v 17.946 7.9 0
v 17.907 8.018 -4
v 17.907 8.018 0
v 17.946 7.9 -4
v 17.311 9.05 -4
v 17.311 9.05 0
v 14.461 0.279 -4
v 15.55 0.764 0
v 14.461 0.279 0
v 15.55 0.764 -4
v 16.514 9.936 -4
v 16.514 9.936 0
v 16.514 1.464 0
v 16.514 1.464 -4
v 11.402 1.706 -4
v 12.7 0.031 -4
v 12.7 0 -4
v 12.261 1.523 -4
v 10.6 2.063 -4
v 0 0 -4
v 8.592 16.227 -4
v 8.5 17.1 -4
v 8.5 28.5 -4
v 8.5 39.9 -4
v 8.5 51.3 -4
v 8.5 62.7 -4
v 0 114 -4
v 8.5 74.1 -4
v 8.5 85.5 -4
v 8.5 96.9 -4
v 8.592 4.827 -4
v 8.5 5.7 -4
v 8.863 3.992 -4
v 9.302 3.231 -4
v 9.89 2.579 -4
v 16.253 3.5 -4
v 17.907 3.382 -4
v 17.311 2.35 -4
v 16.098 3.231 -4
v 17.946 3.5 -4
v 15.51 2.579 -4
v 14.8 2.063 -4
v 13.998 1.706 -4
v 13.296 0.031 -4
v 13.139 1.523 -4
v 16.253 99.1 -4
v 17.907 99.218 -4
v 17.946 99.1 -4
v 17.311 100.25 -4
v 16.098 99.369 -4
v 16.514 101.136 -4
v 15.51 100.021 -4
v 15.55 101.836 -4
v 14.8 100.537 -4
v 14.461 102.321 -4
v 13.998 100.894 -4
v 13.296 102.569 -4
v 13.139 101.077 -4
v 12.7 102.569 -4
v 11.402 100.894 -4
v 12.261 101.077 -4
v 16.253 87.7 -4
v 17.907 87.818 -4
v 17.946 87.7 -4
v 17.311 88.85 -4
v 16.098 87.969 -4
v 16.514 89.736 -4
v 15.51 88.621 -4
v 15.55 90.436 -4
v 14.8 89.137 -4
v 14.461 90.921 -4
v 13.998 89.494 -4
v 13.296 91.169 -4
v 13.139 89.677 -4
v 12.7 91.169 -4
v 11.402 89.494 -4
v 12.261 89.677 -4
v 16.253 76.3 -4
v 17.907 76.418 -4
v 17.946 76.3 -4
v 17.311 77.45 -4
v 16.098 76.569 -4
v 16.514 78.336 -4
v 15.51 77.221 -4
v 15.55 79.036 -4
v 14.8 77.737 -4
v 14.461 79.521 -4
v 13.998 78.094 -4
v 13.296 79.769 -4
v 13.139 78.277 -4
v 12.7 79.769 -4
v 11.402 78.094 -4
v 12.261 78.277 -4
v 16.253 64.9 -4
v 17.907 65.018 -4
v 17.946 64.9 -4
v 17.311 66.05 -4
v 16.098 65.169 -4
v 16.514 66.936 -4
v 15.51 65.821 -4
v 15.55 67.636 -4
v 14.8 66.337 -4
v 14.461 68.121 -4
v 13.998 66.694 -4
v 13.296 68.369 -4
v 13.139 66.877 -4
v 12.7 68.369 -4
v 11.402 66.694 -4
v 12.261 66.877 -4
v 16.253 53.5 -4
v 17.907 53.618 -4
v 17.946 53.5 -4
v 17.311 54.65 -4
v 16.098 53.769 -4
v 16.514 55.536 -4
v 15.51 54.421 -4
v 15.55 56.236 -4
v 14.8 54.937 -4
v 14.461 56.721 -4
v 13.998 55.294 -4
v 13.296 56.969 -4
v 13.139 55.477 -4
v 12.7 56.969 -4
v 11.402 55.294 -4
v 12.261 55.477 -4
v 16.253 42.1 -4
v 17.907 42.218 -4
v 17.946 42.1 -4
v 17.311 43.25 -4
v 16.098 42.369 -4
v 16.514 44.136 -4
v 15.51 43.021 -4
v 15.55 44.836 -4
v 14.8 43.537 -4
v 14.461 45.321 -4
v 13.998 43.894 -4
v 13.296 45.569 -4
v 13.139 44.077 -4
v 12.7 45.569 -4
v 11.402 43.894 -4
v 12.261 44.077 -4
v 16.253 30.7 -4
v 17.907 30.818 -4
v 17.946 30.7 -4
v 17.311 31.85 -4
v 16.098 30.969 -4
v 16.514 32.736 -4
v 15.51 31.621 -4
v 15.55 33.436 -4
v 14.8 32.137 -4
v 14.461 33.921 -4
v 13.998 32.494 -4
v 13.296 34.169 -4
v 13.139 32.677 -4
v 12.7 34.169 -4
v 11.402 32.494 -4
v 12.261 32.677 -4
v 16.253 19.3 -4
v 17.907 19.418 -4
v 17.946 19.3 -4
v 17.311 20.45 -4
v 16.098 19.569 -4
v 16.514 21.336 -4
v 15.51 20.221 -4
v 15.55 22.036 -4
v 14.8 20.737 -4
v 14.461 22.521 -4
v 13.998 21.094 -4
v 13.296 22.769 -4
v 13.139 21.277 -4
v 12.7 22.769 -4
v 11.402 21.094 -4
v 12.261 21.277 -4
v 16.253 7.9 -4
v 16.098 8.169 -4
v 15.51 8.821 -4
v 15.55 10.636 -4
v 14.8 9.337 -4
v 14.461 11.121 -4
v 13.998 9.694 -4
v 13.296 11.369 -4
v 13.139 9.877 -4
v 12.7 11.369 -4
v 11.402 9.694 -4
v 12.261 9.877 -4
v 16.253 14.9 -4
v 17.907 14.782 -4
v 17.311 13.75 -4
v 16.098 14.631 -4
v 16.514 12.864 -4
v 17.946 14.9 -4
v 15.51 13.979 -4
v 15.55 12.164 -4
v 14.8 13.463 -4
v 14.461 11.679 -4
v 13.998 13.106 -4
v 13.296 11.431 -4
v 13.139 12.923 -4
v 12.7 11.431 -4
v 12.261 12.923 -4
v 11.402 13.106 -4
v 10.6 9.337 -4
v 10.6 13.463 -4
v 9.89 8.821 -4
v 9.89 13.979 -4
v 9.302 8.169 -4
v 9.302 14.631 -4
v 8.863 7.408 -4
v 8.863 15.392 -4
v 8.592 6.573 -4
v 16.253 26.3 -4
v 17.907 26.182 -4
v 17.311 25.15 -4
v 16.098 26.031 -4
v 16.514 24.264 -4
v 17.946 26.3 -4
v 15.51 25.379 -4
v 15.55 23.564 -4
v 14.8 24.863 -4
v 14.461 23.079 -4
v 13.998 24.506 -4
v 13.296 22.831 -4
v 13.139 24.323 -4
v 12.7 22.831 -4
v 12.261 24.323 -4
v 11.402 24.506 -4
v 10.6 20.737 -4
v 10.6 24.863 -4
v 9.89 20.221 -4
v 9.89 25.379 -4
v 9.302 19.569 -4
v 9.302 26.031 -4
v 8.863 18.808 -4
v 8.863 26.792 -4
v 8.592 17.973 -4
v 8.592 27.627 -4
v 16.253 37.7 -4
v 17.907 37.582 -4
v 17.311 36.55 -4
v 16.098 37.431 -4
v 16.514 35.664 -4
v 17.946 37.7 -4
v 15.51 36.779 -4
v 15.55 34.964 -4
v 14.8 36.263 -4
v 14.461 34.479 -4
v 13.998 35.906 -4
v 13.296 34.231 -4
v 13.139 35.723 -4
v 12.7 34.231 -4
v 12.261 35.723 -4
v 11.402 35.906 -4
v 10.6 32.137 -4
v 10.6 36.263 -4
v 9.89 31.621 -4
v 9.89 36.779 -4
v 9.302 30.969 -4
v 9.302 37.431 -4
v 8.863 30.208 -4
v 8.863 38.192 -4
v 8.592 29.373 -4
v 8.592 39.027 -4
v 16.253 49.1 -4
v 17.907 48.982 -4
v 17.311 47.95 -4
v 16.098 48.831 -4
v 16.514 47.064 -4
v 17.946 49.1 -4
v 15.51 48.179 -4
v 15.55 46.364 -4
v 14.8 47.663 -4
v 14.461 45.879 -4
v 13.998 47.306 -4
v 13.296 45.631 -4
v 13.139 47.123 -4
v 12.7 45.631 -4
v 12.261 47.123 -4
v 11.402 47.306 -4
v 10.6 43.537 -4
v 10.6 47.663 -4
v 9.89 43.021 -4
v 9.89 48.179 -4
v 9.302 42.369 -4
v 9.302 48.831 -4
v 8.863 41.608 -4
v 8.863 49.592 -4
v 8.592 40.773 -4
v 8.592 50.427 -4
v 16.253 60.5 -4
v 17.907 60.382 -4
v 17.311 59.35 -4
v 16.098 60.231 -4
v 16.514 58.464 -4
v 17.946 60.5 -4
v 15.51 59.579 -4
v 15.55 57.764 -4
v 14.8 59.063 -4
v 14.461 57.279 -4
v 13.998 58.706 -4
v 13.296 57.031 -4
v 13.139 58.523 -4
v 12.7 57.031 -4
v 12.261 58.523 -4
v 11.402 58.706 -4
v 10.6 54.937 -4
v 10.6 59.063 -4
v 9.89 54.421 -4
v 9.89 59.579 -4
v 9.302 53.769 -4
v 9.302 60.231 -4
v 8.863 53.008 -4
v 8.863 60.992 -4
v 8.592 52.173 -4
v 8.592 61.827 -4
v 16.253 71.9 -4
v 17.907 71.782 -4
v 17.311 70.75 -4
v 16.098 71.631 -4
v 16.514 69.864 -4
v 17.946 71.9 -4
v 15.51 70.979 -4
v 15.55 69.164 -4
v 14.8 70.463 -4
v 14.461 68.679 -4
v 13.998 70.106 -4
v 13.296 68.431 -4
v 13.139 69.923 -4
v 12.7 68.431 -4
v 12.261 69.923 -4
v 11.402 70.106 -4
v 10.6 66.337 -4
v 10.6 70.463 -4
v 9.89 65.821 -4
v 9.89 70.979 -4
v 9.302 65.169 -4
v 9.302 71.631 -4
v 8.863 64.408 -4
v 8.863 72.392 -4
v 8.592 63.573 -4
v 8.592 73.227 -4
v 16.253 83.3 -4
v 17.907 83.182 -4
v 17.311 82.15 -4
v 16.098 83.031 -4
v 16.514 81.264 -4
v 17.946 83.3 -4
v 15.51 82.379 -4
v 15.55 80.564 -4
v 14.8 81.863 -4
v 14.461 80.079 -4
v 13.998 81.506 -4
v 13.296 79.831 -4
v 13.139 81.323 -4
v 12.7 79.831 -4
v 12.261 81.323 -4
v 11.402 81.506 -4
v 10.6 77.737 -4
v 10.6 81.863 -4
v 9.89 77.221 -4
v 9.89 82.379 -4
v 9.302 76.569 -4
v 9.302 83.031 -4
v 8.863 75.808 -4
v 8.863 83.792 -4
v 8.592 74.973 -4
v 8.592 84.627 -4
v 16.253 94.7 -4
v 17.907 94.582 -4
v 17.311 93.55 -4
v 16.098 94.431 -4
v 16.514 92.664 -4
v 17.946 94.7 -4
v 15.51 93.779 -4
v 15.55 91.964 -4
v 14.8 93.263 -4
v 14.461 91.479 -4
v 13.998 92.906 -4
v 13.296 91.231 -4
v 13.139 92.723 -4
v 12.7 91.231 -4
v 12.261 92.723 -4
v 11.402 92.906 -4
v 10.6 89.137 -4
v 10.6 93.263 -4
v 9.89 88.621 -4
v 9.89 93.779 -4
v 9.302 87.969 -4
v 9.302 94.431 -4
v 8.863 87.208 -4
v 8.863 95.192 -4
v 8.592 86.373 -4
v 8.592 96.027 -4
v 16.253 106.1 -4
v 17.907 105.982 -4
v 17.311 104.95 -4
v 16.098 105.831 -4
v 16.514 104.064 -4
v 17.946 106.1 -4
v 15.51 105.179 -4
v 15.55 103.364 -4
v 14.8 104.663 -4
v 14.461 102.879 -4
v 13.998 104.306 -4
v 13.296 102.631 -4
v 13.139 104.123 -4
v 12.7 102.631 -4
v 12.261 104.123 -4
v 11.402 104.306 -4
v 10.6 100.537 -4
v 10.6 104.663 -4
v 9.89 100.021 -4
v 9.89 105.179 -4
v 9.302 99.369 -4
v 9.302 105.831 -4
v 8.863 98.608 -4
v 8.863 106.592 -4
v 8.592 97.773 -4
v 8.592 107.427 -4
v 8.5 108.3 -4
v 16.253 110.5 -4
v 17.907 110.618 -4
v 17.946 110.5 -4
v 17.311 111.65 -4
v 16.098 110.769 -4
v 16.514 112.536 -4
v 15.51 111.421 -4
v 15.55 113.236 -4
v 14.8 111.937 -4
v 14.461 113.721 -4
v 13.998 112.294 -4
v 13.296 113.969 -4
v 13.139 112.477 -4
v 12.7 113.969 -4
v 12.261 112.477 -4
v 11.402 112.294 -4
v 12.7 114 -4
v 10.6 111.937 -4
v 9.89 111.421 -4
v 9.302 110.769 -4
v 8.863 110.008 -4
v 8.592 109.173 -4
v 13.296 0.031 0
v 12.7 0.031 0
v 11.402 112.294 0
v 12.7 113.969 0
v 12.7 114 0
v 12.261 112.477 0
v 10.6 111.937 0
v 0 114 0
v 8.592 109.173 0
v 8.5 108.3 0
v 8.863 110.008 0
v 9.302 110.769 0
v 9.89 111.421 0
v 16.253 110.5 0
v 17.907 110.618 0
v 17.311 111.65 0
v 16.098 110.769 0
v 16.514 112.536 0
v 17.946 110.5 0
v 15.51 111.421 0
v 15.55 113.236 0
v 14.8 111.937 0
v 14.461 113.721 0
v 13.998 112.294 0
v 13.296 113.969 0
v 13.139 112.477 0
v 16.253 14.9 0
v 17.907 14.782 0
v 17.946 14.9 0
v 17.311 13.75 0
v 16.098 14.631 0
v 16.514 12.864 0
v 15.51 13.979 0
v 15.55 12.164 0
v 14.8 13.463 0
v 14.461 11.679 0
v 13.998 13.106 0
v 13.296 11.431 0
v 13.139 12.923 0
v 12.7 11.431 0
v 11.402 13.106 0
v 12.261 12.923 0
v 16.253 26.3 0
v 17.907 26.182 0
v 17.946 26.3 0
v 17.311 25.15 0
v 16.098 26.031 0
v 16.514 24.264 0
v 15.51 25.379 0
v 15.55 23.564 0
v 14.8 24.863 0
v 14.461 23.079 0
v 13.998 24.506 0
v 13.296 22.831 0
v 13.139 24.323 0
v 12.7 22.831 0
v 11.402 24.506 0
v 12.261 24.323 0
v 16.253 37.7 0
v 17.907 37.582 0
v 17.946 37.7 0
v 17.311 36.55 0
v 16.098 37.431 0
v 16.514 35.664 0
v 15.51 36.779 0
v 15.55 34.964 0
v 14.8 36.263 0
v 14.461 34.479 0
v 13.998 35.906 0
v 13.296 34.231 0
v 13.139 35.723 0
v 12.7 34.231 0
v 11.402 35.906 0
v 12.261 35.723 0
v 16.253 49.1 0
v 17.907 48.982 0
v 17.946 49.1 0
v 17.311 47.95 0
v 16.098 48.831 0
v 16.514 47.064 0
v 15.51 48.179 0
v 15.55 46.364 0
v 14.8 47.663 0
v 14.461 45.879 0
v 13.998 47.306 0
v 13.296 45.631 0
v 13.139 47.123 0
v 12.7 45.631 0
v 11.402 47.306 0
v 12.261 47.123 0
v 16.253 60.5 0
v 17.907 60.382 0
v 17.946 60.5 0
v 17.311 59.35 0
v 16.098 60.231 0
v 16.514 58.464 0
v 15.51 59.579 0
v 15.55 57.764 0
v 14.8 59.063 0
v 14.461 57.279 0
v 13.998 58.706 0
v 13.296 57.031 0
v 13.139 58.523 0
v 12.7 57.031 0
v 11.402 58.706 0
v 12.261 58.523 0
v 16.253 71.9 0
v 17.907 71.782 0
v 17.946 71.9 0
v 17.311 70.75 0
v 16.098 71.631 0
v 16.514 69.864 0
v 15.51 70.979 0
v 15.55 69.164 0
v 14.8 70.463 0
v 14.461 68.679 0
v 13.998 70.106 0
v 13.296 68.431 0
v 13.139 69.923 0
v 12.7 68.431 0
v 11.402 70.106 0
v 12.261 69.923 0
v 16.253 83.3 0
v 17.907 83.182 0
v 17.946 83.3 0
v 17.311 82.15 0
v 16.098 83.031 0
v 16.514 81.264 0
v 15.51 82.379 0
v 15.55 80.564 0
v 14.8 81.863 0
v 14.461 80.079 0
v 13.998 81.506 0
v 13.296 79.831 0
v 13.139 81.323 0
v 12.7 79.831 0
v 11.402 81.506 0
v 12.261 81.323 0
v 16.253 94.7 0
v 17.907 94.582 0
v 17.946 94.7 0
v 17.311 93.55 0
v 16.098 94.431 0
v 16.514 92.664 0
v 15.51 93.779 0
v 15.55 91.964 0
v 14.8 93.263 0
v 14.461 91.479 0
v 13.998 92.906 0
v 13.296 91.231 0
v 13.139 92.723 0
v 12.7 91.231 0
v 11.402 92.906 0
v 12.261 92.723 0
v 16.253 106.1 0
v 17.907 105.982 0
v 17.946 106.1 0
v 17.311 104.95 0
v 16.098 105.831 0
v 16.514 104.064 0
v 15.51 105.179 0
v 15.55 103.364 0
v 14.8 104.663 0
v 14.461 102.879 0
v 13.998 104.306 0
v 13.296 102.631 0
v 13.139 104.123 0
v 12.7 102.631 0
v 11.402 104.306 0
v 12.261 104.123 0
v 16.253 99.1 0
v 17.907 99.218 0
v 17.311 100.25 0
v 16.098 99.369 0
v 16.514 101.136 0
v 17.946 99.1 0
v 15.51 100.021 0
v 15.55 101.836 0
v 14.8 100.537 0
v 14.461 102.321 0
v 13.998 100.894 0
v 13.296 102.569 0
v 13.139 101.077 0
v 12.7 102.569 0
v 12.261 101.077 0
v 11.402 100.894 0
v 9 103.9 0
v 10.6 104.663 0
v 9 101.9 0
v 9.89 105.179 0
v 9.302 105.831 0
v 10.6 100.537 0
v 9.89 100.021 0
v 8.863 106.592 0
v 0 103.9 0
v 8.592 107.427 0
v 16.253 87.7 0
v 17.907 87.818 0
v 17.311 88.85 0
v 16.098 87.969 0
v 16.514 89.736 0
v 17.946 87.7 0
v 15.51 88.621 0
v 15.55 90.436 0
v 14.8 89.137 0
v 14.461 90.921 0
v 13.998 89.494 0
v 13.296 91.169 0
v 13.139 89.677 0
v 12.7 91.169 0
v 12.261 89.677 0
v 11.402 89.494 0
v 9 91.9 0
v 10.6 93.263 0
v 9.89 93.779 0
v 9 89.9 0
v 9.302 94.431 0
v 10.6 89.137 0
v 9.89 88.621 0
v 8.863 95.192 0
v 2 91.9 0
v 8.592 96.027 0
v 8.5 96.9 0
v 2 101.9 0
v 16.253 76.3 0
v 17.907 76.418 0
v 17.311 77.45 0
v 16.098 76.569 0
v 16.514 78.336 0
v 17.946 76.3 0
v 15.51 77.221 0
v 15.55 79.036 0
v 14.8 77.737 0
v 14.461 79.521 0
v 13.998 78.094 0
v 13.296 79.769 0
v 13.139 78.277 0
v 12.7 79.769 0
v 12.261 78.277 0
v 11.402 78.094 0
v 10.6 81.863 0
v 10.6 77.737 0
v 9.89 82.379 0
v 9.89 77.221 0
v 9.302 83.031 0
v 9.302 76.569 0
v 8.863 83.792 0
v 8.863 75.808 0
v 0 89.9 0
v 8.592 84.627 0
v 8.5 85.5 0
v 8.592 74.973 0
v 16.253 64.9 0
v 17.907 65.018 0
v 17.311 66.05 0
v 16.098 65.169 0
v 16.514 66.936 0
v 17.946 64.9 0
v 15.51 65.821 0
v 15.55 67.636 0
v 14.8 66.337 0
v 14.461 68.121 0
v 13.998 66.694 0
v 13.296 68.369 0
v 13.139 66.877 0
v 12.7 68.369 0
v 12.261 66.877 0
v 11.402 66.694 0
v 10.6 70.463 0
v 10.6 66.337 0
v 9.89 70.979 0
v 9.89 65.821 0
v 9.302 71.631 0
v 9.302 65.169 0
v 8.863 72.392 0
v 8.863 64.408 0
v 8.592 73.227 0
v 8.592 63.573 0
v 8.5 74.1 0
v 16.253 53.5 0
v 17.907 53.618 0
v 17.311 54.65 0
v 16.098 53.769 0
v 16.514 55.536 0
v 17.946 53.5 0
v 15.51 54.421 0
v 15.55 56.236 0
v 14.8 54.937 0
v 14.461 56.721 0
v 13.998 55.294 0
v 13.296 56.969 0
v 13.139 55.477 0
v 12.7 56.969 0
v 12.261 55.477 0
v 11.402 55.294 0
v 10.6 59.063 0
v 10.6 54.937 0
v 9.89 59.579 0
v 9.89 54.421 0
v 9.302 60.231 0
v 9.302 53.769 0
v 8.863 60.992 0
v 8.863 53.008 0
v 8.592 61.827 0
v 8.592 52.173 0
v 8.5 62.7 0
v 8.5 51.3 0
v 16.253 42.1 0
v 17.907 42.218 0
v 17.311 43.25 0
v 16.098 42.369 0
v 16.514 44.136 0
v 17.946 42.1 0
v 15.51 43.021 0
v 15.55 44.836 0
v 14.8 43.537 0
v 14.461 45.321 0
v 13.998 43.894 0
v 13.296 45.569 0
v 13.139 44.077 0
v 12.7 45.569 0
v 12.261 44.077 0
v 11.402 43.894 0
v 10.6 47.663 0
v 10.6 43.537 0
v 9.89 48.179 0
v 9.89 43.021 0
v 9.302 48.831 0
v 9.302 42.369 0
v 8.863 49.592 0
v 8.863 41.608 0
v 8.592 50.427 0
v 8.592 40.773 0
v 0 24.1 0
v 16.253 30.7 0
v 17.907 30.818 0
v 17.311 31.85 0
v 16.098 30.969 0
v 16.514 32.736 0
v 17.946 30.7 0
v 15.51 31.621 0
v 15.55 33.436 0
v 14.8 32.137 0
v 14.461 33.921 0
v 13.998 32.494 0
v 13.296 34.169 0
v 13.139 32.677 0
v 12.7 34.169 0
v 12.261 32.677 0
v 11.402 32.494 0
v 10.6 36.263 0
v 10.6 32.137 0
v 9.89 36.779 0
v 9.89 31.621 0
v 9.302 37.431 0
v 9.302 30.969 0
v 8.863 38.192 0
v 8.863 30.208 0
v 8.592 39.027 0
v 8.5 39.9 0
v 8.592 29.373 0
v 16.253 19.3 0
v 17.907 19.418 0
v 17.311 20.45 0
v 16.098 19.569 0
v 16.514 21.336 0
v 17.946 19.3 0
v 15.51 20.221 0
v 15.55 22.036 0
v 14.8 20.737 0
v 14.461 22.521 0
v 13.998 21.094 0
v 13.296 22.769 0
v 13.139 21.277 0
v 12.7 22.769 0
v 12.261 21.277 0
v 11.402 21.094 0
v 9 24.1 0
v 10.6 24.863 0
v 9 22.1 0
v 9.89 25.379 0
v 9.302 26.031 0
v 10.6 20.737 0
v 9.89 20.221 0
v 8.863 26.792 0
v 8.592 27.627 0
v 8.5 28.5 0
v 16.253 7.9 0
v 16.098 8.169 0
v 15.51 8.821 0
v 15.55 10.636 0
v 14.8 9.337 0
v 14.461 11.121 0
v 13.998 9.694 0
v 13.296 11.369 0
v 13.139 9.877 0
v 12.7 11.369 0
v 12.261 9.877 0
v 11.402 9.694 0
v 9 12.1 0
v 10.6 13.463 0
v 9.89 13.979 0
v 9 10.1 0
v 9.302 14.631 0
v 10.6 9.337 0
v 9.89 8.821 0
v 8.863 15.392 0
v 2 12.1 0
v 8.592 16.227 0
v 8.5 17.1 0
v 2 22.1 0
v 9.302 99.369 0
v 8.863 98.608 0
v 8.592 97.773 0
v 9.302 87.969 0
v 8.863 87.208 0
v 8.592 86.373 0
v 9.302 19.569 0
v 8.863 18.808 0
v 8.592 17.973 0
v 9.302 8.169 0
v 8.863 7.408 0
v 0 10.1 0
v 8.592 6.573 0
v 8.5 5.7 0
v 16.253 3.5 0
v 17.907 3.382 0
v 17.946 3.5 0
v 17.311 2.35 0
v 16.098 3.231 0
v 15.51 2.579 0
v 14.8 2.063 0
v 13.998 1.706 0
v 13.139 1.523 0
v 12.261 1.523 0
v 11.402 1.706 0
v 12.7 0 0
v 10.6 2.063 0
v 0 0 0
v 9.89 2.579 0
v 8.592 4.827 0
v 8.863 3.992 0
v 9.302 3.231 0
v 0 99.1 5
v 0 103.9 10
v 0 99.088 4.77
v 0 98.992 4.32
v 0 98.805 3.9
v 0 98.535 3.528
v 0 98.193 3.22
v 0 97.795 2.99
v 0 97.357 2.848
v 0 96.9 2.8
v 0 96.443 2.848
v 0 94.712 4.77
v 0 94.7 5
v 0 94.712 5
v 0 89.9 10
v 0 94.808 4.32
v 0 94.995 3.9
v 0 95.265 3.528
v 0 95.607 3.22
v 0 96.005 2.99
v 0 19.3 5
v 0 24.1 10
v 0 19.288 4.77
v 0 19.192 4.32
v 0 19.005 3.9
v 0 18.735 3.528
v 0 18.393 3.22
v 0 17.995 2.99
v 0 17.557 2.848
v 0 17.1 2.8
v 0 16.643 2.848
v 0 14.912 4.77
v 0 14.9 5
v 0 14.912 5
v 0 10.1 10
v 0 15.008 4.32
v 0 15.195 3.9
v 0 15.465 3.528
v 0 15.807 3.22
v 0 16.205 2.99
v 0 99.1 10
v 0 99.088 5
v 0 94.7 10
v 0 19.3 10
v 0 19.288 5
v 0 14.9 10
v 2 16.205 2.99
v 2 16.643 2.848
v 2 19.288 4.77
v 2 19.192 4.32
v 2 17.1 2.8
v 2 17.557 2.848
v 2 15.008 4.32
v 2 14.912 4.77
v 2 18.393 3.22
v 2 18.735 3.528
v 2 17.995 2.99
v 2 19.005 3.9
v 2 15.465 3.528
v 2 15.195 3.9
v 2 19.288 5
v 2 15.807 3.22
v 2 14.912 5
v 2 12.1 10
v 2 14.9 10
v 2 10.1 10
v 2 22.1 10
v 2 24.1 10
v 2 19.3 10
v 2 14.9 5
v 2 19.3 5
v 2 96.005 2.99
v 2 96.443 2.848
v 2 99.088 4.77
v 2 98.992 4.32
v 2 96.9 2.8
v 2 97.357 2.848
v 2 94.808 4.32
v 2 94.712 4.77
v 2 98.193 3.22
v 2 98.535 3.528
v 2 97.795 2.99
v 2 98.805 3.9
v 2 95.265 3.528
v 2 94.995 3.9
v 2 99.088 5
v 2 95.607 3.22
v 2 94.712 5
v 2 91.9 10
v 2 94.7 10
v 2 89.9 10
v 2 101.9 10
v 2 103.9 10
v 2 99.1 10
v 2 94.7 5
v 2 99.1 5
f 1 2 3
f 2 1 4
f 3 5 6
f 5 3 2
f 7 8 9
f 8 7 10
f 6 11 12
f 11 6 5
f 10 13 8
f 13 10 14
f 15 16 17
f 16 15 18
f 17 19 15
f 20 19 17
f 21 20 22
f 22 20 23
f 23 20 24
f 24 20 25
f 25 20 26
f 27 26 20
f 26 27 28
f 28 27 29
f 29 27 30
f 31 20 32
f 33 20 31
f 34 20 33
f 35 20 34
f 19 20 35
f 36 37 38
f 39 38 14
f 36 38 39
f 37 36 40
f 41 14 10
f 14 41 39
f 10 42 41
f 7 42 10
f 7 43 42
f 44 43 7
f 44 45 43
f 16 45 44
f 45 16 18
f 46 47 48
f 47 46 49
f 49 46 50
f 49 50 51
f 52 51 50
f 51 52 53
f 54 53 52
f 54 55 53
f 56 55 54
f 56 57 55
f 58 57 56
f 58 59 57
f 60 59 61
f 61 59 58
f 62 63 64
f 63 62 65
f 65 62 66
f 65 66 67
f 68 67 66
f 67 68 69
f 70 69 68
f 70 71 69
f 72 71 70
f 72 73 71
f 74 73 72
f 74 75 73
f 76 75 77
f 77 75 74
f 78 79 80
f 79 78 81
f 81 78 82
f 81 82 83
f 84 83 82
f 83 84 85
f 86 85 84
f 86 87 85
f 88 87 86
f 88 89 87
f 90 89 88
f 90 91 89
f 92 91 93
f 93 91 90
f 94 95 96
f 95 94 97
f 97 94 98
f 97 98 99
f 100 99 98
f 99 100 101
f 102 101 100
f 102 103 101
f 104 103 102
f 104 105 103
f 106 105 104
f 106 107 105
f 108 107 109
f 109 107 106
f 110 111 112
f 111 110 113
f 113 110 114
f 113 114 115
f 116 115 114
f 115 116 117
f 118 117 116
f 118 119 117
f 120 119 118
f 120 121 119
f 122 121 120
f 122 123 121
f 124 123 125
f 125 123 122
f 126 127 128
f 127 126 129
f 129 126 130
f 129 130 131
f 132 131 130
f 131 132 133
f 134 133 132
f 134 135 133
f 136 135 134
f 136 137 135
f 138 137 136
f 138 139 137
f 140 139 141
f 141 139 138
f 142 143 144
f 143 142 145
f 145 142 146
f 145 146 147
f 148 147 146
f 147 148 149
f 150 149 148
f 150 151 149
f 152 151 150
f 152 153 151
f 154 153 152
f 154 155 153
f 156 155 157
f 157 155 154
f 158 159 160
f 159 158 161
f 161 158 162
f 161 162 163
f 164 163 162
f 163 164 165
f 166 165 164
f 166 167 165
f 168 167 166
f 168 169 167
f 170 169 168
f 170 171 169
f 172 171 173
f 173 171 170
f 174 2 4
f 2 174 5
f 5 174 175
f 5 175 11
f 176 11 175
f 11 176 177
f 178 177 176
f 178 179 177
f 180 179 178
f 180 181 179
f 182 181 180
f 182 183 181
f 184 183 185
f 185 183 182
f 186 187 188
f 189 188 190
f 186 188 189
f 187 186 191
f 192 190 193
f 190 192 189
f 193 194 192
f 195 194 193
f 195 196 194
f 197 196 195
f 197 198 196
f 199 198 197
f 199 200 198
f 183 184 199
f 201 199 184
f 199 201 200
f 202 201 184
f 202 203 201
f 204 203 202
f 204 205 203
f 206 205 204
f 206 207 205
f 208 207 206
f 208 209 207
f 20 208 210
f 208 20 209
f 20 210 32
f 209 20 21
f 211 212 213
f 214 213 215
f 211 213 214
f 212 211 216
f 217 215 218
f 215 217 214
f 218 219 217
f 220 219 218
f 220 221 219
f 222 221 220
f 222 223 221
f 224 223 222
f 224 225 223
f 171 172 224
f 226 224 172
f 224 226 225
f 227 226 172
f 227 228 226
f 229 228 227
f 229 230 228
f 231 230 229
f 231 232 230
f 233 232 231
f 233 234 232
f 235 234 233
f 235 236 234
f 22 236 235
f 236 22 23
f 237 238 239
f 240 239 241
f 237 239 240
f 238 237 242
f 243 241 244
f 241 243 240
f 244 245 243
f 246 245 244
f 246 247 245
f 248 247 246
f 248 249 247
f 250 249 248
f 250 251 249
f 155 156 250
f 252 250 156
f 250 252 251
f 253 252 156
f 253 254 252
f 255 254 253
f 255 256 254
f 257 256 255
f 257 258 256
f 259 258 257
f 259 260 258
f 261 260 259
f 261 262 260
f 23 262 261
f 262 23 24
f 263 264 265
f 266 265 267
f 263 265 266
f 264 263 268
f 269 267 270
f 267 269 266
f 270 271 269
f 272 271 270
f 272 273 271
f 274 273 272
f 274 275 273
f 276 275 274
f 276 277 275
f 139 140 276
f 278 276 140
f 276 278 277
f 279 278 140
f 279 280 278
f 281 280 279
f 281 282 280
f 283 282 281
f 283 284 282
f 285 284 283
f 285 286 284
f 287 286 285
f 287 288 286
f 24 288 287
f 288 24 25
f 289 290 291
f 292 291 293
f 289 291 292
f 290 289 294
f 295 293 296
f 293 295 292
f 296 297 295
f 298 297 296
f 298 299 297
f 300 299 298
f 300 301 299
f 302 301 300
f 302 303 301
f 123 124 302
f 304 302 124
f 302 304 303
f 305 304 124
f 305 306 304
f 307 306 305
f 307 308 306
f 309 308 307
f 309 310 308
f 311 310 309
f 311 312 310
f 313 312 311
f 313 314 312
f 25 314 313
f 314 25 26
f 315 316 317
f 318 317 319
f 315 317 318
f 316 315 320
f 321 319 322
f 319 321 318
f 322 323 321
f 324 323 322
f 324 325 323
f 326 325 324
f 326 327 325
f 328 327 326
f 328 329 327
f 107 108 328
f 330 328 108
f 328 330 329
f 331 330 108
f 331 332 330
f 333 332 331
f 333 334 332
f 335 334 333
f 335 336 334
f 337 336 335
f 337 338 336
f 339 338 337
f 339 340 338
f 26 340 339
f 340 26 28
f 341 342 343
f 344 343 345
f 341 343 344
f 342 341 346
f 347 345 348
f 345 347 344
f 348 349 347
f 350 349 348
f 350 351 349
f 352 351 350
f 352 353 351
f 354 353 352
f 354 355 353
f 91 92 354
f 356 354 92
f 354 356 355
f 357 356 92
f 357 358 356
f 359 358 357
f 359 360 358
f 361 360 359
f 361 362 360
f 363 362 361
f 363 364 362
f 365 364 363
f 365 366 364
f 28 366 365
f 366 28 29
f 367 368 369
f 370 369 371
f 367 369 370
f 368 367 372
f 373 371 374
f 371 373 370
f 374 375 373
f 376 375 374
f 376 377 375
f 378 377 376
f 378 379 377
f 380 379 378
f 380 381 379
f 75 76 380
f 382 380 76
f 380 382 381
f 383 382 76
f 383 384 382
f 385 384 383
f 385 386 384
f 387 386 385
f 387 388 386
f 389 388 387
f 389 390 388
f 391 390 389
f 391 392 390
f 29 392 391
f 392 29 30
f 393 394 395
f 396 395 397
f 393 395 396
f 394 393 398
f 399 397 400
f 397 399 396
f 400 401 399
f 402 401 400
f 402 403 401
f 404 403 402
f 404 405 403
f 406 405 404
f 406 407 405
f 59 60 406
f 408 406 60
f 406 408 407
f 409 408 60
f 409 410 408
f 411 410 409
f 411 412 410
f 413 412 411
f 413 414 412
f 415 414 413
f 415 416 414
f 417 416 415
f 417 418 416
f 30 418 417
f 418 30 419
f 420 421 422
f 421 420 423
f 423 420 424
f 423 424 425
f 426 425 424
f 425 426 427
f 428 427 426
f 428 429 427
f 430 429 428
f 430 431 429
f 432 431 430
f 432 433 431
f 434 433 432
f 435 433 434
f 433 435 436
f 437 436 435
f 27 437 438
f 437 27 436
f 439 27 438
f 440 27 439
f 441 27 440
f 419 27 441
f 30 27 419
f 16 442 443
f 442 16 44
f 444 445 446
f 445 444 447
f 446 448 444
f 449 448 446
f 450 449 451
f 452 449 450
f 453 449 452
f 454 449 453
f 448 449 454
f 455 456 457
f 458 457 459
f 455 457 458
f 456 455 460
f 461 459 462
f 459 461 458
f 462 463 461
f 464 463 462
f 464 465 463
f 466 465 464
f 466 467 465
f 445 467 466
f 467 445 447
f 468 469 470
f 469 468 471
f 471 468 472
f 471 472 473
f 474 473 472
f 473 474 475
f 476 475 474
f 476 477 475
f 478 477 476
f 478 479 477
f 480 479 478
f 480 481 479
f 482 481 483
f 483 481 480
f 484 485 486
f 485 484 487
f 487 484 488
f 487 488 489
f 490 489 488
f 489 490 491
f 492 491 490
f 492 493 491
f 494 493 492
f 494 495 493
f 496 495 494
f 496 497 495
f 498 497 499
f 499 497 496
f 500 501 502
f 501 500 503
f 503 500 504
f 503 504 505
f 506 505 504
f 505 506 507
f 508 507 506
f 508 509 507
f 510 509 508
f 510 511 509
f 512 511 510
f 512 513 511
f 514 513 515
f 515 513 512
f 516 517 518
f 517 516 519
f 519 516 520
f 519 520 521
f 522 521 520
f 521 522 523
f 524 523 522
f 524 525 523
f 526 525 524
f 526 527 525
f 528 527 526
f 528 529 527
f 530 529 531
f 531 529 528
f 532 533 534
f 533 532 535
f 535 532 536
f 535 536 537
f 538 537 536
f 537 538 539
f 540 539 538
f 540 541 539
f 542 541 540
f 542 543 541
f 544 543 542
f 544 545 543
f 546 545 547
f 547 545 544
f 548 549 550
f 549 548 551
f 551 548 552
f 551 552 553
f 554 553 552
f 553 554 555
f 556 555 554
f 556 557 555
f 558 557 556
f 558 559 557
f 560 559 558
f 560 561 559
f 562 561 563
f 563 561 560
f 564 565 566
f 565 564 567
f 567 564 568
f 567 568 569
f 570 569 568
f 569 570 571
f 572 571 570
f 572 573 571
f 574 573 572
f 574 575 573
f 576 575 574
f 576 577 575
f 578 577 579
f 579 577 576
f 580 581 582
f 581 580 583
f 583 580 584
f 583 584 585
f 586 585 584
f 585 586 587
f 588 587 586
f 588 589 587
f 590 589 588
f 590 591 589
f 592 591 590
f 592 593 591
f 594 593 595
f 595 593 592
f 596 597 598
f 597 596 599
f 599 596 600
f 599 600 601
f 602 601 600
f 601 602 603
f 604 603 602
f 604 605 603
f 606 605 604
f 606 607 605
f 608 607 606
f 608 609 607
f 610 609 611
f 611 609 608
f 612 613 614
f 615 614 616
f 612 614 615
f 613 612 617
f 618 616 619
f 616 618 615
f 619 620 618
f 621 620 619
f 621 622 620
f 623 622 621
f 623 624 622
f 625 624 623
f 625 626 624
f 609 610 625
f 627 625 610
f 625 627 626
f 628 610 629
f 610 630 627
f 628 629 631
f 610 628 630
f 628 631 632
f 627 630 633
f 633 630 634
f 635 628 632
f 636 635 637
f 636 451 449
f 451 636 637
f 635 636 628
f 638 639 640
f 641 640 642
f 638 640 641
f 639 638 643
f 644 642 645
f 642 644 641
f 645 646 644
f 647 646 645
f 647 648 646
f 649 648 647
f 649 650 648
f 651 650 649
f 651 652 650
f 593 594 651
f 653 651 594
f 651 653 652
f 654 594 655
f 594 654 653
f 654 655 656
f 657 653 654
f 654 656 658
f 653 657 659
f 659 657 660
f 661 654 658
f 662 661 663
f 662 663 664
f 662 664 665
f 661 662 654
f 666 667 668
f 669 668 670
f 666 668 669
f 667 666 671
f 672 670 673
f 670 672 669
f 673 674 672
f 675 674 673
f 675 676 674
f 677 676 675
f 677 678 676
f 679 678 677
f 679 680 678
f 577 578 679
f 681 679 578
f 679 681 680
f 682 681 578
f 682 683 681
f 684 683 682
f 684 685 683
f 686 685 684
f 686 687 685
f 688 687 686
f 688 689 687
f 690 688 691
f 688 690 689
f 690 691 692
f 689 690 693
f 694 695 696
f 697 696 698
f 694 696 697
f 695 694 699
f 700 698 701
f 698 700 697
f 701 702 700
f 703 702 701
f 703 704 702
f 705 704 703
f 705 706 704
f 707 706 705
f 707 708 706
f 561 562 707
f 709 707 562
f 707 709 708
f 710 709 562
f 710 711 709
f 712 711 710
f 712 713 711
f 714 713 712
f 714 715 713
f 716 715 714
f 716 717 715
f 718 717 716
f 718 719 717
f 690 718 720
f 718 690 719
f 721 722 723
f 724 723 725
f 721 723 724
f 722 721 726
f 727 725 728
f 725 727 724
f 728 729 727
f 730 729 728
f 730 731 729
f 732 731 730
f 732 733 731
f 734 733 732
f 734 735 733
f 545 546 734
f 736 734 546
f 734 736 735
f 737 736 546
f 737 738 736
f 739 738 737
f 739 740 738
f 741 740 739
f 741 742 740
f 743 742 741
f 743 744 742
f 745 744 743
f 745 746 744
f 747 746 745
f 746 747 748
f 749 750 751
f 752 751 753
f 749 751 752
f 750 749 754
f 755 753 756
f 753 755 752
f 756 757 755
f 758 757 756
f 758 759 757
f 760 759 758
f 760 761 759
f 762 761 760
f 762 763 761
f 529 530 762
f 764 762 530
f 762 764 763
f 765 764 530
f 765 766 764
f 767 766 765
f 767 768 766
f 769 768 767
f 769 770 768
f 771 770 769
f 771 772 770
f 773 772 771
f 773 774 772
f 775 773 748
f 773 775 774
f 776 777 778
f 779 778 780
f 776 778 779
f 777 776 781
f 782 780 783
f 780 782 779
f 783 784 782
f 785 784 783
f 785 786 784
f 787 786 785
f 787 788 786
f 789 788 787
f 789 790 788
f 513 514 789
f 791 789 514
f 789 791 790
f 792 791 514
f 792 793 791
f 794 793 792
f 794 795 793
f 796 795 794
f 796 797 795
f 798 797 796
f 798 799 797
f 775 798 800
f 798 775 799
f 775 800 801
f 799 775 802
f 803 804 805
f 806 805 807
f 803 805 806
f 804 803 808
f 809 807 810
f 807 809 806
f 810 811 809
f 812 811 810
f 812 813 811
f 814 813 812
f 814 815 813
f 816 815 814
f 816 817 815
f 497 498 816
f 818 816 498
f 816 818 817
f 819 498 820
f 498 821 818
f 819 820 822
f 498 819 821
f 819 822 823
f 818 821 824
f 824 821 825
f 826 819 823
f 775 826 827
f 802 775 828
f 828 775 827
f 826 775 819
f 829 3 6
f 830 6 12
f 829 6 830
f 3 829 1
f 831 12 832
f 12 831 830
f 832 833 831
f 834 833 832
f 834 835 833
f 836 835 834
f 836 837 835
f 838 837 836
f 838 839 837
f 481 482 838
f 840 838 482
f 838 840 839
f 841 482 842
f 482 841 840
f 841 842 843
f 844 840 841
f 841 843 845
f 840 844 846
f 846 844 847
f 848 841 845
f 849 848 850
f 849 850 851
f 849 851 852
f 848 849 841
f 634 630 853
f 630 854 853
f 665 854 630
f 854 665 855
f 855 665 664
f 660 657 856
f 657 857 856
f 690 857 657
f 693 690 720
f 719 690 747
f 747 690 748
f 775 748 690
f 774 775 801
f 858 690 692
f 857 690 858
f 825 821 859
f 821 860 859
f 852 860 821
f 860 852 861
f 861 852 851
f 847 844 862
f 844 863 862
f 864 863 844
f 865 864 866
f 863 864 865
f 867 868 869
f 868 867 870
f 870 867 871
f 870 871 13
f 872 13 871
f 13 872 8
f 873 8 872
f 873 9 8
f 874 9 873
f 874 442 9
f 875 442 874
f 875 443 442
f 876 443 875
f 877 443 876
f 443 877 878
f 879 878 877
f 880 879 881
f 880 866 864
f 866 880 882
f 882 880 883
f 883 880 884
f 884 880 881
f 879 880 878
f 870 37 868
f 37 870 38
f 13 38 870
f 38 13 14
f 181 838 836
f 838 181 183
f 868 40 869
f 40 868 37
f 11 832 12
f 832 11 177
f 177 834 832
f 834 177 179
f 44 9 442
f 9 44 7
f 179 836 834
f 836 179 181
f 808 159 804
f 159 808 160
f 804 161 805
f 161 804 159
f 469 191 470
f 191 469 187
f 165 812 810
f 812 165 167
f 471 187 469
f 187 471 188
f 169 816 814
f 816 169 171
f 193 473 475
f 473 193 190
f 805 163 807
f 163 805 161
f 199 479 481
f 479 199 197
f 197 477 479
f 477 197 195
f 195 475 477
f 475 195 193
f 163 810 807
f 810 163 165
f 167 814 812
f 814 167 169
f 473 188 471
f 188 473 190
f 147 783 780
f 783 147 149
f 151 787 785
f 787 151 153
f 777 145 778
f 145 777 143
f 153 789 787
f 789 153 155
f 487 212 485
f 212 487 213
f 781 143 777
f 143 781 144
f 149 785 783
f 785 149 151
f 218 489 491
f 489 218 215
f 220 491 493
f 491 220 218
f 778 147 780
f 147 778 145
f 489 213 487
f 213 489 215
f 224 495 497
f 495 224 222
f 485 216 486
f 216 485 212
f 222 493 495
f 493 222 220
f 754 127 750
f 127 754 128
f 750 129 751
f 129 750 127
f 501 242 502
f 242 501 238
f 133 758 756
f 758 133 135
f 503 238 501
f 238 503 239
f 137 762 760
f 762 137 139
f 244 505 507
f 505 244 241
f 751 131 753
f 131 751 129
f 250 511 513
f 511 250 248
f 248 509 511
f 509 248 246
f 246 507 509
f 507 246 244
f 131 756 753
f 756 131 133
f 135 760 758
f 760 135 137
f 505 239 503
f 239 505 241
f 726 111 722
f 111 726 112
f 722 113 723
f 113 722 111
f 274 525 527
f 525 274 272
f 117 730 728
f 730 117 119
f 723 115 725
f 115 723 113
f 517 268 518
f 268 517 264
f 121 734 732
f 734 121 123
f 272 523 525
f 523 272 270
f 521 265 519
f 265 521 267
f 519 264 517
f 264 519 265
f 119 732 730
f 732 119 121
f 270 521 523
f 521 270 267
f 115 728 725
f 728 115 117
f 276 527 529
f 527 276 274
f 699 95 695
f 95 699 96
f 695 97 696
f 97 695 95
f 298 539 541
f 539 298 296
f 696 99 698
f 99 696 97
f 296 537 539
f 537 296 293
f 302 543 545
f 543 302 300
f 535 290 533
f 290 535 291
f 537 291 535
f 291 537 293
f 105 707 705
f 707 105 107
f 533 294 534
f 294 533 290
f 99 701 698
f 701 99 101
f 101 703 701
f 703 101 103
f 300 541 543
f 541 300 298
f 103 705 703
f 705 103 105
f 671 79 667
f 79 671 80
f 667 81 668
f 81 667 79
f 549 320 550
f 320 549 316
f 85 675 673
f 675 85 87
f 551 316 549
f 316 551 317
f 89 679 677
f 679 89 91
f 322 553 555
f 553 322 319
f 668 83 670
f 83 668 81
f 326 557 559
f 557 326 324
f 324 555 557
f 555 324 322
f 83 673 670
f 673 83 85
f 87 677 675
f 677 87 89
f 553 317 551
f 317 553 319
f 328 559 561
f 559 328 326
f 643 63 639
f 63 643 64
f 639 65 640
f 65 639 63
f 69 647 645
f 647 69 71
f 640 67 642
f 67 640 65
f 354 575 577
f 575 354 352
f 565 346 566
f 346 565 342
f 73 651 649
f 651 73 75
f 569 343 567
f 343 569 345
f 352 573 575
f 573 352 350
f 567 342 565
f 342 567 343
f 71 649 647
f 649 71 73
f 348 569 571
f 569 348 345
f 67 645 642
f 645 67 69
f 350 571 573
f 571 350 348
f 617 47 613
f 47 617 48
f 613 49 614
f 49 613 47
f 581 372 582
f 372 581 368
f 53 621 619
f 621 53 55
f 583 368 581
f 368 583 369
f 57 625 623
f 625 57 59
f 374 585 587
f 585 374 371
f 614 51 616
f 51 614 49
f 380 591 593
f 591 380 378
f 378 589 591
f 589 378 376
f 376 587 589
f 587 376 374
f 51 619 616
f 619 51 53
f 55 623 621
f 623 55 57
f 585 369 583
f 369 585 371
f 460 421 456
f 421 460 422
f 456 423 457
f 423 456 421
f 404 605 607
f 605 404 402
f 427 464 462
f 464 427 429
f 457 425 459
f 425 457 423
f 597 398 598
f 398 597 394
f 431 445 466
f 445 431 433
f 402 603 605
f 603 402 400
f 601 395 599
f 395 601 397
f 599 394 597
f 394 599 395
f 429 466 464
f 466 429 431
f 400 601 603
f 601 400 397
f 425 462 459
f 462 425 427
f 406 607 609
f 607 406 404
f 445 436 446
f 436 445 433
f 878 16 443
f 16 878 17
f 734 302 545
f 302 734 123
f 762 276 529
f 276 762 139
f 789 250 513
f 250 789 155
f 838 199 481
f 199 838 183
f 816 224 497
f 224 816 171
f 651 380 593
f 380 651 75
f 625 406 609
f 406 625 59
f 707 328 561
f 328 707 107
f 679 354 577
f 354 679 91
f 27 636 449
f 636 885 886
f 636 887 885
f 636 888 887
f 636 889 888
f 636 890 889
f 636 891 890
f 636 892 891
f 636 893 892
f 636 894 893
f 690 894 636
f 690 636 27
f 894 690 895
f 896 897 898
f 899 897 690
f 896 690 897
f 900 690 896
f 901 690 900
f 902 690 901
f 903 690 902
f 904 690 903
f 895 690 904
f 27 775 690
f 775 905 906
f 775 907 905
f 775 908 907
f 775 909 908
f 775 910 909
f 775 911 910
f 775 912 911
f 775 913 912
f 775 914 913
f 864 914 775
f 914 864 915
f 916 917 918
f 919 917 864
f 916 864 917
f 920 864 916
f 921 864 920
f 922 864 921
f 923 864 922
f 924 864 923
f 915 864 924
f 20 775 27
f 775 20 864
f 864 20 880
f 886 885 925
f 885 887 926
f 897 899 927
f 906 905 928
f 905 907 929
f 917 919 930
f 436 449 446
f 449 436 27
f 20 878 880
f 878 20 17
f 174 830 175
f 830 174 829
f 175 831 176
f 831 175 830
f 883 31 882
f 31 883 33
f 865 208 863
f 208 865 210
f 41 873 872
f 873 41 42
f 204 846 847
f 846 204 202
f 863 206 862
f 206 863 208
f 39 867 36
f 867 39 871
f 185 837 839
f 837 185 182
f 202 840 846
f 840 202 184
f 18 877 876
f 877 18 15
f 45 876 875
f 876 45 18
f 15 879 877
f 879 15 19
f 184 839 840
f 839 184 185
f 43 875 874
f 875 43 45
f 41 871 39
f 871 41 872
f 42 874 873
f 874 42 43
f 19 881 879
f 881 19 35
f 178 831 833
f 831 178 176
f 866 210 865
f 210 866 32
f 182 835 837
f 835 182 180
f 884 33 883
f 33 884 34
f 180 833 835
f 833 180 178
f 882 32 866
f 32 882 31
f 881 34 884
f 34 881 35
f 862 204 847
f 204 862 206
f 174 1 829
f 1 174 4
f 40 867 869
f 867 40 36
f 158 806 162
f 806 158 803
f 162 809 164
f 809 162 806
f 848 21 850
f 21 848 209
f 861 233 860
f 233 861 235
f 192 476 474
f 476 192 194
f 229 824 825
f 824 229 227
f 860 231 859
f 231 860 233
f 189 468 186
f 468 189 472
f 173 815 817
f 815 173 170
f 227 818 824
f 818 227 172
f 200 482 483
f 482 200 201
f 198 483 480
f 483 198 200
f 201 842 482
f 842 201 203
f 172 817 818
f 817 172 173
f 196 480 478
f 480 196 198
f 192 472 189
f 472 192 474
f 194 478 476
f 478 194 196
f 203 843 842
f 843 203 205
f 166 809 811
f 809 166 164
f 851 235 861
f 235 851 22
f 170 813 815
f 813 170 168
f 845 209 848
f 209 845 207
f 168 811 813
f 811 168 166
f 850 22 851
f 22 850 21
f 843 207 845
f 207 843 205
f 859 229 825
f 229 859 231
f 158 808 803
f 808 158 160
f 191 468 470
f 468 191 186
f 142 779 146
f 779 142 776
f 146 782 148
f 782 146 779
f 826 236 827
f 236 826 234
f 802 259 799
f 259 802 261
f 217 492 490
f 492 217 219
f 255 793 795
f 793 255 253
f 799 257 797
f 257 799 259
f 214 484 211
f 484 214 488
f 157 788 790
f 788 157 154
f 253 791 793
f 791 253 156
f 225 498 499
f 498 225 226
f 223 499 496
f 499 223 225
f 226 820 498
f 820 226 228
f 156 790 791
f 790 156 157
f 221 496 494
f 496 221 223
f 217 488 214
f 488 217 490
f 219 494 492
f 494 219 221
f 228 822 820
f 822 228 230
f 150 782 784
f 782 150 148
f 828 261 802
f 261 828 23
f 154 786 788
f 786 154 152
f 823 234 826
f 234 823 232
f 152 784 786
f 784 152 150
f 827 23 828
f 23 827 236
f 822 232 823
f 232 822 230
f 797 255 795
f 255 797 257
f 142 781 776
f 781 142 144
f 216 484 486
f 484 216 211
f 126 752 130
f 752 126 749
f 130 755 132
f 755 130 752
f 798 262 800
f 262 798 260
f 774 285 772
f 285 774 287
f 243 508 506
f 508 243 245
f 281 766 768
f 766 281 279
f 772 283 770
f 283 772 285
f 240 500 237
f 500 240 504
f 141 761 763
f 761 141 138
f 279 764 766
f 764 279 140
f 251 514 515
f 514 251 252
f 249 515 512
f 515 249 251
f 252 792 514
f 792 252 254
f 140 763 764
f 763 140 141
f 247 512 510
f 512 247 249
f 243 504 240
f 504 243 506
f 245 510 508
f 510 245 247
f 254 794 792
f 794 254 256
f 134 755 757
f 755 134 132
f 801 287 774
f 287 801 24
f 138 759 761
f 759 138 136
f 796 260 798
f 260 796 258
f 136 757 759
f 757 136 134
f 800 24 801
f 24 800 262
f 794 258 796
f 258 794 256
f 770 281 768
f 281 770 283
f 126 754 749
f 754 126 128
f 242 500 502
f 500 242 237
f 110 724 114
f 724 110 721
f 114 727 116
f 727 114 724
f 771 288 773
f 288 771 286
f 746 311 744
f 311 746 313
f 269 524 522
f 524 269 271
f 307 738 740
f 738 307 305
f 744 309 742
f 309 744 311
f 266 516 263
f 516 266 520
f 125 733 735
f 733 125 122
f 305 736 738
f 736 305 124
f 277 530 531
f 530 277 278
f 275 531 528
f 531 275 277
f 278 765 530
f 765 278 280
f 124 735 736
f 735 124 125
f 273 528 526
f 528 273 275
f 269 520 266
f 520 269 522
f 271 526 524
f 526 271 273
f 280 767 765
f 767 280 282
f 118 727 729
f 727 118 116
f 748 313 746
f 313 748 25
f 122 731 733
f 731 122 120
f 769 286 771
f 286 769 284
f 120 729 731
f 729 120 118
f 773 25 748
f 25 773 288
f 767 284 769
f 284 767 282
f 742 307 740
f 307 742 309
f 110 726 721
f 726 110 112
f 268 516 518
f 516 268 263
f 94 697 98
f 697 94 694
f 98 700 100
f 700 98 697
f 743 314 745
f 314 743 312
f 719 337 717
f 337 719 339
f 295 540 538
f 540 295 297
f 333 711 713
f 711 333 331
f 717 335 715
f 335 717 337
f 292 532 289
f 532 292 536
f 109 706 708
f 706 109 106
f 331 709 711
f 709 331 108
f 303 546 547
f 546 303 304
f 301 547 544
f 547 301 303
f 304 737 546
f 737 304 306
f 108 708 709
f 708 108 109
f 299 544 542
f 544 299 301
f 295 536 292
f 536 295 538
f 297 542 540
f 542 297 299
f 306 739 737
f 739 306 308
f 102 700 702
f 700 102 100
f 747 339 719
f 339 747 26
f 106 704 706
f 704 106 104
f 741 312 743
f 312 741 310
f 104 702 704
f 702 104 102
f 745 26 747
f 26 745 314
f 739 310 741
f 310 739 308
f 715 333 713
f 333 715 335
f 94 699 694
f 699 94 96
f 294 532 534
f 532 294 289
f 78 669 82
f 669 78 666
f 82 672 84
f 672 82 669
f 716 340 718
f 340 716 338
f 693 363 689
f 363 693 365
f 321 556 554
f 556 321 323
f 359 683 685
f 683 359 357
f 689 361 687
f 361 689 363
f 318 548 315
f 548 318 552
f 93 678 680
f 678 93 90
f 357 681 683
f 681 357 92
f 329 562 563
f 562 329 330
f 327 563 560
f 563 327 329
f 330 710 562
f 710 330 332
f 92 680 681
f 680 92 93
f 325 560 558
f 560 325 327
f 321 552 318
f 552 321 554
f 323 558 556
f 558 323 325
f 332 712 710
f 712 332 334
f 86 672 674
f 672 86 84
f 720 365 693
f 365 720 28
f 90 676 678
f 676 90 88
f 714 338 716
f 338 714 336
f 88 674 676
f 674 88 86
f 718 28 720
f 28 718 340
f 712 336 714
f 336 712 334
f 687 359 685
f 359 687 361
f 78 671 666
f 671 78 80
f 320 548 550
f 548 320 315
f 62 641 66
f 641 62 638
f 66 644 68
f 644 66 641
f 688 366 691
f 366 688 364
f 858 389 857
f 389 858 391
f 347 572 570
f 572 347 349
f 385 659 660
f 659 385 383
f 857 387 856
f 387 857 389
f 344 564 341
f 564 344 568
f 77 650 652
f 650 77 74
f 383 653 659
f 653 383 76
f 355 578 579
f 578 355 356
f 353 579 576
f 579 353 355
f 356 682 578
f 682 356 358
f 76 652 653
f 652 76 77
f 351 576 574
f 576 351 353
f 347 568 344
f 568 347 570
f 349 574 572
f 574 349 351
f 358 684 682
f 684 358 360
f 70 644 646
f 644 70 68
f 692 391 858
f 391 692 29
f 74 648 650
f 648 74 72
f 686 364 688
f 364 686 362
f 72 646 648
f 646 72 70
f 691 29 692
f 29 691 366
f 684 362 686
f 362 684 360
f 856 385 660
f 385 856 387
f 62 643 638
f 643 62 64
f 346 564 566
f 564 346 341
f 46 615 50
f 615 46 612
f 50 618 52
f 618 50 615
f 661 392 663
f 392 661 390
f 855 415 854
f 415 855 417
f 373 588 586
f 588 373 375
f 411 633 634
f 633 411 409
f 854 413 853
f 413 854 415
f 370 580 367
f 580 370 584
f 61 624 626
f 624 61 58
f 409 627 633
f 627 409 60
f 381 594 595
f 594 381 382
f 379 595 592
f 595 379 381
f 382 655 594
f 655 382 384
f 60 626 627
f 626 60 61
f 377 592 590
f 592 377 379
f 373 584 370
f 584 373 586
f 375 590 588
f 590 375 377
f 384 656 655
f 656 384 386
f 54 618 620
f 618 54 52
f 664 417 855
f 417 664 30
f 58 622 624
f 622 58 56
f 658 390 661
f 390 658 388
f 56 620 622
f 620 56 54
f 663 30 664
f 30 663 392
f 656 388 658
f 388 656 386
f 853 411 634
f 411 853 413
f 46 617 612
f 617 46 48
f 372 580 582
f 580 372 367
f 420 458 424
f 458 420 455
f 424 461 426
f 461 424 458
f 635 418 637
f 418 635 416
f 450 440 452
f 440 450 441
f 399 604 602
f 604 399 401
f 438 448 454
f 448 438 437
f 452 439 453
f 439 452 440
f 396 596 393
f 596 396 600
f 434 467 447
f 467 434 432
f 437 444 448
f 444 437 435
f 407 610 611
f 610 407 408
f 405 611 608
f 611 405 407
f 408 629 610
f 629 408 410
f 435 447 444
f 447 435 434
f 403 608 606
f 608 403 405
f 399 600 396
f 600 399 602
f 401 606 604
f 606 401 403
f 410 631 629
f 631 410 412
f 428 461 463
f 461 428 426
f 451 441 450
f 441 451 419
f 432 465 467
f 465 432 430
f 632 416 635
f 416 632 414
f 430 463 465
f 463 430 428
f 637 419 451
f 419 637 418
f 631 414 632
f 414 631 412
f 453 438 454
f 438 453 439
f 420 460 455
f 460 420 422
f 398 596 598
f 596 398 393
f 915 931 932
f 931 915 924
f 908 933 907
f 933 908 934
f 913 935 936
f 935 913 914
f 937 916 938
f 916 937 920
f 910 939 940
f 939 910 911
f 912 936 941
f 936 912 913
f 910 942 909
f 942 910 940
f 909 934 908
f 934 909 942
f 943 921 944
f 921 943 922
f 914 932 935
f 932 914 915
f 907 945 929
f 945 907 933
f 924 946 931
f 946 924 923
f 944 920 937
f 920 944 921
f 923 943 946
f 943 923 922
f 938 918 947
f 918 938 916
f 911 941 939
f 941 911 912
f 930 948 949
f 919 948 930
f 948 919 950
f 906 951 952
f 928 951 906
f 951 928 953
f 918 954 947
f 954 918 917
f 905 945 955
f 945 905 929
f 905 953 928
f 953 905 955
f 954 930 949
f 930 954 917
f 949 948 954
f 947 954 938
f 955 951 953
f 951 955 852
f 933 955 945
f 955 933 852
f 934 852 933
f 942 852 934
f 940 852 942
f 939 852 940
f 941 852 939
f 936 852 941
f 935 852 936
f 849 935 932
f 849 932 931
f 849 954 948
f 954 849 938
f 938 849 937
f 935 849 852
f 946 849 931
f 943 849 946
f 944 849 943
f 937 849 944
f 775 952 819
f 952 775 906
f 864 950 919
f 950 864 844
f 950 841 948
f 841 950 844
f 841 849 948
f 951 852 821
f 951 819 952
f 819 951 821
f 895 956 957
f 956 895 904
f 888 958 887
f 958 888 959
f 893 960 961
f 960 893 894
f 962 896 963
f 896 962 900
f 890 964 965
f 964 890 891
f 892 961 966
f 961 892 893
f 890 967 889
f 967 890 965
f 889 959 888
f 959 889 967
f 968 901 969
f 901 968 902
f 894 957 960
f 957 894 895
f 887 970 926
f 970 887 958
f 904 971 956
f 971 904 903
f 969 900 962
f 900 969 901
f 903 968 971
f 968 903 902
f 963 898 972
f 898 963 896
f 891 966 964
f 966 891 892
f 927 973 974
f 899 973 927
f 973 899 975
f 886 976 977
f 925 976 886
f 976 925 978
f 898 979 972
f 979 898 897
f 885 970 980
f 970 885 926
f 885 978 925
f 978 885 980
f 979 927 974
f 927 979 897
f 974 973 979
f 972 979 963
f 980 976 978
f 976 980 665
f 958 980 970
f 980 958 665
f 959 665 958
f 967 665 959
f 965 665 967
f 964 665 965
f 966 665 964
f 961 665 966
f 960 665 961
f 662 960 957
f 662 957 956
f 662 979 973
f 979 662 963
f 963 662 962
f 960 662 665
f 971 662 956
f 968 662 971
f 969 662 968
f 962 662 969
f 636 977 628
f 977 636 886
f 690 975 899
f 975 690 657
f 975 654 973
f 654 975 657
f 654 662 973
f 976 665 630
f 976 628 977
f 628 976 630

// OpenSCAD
// Parametric USB Cable Organizer - GuyC

// note that with default replicatorG 1-extra-shell, 10% infill
// options the fingers formed by these rings will get a shell
// but no infill, so you can see through them.  I'm happy with
// that, but you may not be.

// Dimensions for the ring

ringInnerRadius = 4.2;     // radius of hole
ringThickness   = 1.5;     // wall thickness of rings
ringPadding     = 0.0;     // extra spacing between rings
ringNotch       = 4.4;     // notch wide enough to let cable pass through
ringOuterRadius = ringInnerRadius + ringThickness;

// Dimensions for the buttressed wall-attachment brackets

bracketHeight      = 10.0;  
bracketWidth       = 14.0;  // suggest 2*ringOuterRadius+ringPadding+bracketWall/2
bracketWall        =  2.0;  // thickness of back wall and buttresses
bracketBaseOffset  =  7.0;  // offset of base of buttress
bracketSlotWidth   =  4.4;  // wide enough for shaft of screw
bracketSlotDepth   =  5.0;  // suggest bracketHeight/2

// Overall platform size is determined by the depth and number of rings

platformDepth      =  4.0;  // thickness of platform
noRings            = 10;    // number of rings


function ringOrigin(i) = [bracketBaseOffset+ringOuterRadius,ringOuterRadius+(ringOuterRadius*2+ringPadding)*i,-platformDepth];

// support()
// Triangular buttress for supporting bracket.

module support()
{
    polyhedron (
	    points = [
 			[0, 0, bracketHeight],
           [0, bracketWall, bracketHeight], 
           [0, bracketWall, 0], 
           [0, 0, 0],
           [bracketBaseOffset, 0, 0],
           [bracketBaseOffset, bracketWall, 0]
        ],
        triangles = [[0,3,2],
                     [0,2,1],
                     [3,0,4],
                     [1,2,5], 
                     [0,5,4],
                     [0,1,5],
                     [5,2,4],
                     [4,2,3],
     ]);
}

// bracket(i)
// Bracket with buttresses and screw slot positioned
// so that it is aligned with the ith ring.  i MUST
// be >=0 and < noRings, but will overhang the platform
// slightly in the first and last positions, so I recommend
// i=1 and i=noRings-2.

// note that the negative geometries for the screw hole extend
// 1mm either side of the bracket to avoid co-incident faces.

module bracket(i)
{

	y = ringOrigin(i)[1];
    translate([0,y,0]) {
  	  difference() {
		// back wall
		translate([0, -bracketWidth/2,0]) 
			cube(size=[bracketWall, bracketWidth, bracketHeight], center=false);
		union() {
			// hole for slot
			translate([-1,0,bracketHeight-bracketSlotDepth]) 
			{
				rotate([0,90,0]) 
	       			cylinder(h=bracketWall+2,r=bracketSlotWidth/2,$fs=0.1);
			}
			// slot
			translate([0,-bracketSlotWidth/2,bracketHeight-bracketSlotDepth])
				cube(size=[bracketWall+2, bracketSlotWidth, bracketSlotDepth], center=false);
		}
	  }

  	  // left support
     translate([bracketWall,-bracketWidth/2,0])
		support();
	 // right support
     translate([bracketWall,bracketWidth/2-bracketWall,0])
		support();
	}
}

// platform()
// The rectangular body of the platform.

module platform()
{
	translate([0,0,-platformDepth])
		cube(size=[bracketBaseOffset+ringOuterRadius, noRings*2*ringOuterRadius+(noRings-1)*ringPadding, platformDepth]);
}

// ringPositive(i)
// The positive geometry of the ith ring which will be added to the platform()

module ringPositive(i)
{	translate(ringOrigin(i))
		cylinder(h=platformDepth, r=ringOuterRadius, $fs=0.1);
}

// ringNegative(i)
// The negative geometry of the ith ring which will be subtracted from the platform()
// Note that we arbitrarily extend this 2mm above and below the positive geometry
// to ensure that we do not have co-incident faces.

module ringNegative(i)
{
	translate(ringOrigin(i)) {
		translate([0,0,-1]) {
			union() {
				cylinder(h=platformDepth+2, r=ringInnerRadius, $fs=0.1);
				translate([ringOuterRadius/2,0,platformDepth/2+1])
					cube(size=[ringOuterRadius+1,bracketSlotWidth,platformDepth+2], center=true);
			}
		}
	}
}


// FINAL GEOMETRY
// We construct the platform and the positive ring geometry, then
// remove the negative ring geometry.

difference() {
	union() {
		platform();
		for(i = [0 : noRings-1]) {
			ringPositive(i);
		}
	}
	union() {
		for(i = [0 : noRings-1]) {
			ringNegative(i);
		}
	}
}
// brackets at 2nd and 2nd last position
bracket(1);
if (noRings>3) bracket(noRings-2);
